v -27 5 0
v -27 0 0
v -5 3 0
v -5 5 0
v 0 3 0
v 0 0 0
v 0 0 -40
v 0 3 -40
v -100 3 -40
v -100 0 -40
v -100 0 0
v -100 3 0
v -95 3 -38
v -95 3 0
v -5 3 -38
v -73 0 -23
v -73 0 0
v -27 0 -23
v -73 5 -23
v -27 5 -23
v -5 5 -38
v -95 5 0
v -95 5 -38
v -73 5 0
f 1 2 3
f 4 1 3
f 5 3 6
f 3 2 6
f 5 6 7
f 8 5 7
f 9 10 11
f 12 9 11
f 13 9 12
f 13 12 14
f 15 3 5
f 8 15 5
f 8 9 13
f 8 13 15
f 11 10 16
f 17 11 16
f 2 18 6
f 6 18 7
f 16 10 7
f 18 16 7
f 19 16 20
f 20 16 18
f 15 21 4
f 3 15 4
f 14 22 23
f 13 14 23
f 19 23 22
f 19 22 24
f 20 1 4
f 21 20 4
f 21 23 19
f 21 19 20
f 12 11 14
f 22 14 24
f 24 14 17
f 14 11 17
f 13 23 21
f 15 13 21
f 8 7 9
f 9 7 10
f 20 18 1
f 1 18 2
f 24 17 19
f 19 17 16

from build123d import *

# Parameters (mm, degrees)
BOSS_EXTRUDE1_DEPTH = 5
SKETCH2_W           = 90
SKETCH2_H           = 2
CUT_EXTRUDE1_DEPTH  = 2


with BuildPart() as part:
    # Sketch1 → Boss-Extrude1 (new body)
    with BuildSketch(Plane(origin=(0, 0, 0), x_dir=(1, 0, 0), z_dir=(0, 1, 0))):
        Polygon((-27, 0), (0, 0), (0, 40), (-100, 40), (-100, 0), (-73, 0), (-73, 23), (-27, 23), align=None)
    extrude(amount=BOSS_EXTRUDE1_DEPTH)

    # Sketch2 → Cut-Extrude1 (cut)
    with BuildSketch(Plane(origin=(0, 5, 0), x_dir=(1, 0, 0), z_dir=(0, 1, 0))):
        Polygon((-100, 40), (-100, 0), (-95, 0), (-95, 38), (-95, 40), align=None)
        with Locations((-50, 39)):
            Rectangle(SKETCH2_W, SKETCH2_H)
        Polygon((-5, 40), (-5, 38), (-5, 0), (0, 0), (0, 40), align=None)
    extrude(amount=-CUT_EXTRUDE1_DEPTH, mode=Mode.SUBTRACT)


solid = part.part
